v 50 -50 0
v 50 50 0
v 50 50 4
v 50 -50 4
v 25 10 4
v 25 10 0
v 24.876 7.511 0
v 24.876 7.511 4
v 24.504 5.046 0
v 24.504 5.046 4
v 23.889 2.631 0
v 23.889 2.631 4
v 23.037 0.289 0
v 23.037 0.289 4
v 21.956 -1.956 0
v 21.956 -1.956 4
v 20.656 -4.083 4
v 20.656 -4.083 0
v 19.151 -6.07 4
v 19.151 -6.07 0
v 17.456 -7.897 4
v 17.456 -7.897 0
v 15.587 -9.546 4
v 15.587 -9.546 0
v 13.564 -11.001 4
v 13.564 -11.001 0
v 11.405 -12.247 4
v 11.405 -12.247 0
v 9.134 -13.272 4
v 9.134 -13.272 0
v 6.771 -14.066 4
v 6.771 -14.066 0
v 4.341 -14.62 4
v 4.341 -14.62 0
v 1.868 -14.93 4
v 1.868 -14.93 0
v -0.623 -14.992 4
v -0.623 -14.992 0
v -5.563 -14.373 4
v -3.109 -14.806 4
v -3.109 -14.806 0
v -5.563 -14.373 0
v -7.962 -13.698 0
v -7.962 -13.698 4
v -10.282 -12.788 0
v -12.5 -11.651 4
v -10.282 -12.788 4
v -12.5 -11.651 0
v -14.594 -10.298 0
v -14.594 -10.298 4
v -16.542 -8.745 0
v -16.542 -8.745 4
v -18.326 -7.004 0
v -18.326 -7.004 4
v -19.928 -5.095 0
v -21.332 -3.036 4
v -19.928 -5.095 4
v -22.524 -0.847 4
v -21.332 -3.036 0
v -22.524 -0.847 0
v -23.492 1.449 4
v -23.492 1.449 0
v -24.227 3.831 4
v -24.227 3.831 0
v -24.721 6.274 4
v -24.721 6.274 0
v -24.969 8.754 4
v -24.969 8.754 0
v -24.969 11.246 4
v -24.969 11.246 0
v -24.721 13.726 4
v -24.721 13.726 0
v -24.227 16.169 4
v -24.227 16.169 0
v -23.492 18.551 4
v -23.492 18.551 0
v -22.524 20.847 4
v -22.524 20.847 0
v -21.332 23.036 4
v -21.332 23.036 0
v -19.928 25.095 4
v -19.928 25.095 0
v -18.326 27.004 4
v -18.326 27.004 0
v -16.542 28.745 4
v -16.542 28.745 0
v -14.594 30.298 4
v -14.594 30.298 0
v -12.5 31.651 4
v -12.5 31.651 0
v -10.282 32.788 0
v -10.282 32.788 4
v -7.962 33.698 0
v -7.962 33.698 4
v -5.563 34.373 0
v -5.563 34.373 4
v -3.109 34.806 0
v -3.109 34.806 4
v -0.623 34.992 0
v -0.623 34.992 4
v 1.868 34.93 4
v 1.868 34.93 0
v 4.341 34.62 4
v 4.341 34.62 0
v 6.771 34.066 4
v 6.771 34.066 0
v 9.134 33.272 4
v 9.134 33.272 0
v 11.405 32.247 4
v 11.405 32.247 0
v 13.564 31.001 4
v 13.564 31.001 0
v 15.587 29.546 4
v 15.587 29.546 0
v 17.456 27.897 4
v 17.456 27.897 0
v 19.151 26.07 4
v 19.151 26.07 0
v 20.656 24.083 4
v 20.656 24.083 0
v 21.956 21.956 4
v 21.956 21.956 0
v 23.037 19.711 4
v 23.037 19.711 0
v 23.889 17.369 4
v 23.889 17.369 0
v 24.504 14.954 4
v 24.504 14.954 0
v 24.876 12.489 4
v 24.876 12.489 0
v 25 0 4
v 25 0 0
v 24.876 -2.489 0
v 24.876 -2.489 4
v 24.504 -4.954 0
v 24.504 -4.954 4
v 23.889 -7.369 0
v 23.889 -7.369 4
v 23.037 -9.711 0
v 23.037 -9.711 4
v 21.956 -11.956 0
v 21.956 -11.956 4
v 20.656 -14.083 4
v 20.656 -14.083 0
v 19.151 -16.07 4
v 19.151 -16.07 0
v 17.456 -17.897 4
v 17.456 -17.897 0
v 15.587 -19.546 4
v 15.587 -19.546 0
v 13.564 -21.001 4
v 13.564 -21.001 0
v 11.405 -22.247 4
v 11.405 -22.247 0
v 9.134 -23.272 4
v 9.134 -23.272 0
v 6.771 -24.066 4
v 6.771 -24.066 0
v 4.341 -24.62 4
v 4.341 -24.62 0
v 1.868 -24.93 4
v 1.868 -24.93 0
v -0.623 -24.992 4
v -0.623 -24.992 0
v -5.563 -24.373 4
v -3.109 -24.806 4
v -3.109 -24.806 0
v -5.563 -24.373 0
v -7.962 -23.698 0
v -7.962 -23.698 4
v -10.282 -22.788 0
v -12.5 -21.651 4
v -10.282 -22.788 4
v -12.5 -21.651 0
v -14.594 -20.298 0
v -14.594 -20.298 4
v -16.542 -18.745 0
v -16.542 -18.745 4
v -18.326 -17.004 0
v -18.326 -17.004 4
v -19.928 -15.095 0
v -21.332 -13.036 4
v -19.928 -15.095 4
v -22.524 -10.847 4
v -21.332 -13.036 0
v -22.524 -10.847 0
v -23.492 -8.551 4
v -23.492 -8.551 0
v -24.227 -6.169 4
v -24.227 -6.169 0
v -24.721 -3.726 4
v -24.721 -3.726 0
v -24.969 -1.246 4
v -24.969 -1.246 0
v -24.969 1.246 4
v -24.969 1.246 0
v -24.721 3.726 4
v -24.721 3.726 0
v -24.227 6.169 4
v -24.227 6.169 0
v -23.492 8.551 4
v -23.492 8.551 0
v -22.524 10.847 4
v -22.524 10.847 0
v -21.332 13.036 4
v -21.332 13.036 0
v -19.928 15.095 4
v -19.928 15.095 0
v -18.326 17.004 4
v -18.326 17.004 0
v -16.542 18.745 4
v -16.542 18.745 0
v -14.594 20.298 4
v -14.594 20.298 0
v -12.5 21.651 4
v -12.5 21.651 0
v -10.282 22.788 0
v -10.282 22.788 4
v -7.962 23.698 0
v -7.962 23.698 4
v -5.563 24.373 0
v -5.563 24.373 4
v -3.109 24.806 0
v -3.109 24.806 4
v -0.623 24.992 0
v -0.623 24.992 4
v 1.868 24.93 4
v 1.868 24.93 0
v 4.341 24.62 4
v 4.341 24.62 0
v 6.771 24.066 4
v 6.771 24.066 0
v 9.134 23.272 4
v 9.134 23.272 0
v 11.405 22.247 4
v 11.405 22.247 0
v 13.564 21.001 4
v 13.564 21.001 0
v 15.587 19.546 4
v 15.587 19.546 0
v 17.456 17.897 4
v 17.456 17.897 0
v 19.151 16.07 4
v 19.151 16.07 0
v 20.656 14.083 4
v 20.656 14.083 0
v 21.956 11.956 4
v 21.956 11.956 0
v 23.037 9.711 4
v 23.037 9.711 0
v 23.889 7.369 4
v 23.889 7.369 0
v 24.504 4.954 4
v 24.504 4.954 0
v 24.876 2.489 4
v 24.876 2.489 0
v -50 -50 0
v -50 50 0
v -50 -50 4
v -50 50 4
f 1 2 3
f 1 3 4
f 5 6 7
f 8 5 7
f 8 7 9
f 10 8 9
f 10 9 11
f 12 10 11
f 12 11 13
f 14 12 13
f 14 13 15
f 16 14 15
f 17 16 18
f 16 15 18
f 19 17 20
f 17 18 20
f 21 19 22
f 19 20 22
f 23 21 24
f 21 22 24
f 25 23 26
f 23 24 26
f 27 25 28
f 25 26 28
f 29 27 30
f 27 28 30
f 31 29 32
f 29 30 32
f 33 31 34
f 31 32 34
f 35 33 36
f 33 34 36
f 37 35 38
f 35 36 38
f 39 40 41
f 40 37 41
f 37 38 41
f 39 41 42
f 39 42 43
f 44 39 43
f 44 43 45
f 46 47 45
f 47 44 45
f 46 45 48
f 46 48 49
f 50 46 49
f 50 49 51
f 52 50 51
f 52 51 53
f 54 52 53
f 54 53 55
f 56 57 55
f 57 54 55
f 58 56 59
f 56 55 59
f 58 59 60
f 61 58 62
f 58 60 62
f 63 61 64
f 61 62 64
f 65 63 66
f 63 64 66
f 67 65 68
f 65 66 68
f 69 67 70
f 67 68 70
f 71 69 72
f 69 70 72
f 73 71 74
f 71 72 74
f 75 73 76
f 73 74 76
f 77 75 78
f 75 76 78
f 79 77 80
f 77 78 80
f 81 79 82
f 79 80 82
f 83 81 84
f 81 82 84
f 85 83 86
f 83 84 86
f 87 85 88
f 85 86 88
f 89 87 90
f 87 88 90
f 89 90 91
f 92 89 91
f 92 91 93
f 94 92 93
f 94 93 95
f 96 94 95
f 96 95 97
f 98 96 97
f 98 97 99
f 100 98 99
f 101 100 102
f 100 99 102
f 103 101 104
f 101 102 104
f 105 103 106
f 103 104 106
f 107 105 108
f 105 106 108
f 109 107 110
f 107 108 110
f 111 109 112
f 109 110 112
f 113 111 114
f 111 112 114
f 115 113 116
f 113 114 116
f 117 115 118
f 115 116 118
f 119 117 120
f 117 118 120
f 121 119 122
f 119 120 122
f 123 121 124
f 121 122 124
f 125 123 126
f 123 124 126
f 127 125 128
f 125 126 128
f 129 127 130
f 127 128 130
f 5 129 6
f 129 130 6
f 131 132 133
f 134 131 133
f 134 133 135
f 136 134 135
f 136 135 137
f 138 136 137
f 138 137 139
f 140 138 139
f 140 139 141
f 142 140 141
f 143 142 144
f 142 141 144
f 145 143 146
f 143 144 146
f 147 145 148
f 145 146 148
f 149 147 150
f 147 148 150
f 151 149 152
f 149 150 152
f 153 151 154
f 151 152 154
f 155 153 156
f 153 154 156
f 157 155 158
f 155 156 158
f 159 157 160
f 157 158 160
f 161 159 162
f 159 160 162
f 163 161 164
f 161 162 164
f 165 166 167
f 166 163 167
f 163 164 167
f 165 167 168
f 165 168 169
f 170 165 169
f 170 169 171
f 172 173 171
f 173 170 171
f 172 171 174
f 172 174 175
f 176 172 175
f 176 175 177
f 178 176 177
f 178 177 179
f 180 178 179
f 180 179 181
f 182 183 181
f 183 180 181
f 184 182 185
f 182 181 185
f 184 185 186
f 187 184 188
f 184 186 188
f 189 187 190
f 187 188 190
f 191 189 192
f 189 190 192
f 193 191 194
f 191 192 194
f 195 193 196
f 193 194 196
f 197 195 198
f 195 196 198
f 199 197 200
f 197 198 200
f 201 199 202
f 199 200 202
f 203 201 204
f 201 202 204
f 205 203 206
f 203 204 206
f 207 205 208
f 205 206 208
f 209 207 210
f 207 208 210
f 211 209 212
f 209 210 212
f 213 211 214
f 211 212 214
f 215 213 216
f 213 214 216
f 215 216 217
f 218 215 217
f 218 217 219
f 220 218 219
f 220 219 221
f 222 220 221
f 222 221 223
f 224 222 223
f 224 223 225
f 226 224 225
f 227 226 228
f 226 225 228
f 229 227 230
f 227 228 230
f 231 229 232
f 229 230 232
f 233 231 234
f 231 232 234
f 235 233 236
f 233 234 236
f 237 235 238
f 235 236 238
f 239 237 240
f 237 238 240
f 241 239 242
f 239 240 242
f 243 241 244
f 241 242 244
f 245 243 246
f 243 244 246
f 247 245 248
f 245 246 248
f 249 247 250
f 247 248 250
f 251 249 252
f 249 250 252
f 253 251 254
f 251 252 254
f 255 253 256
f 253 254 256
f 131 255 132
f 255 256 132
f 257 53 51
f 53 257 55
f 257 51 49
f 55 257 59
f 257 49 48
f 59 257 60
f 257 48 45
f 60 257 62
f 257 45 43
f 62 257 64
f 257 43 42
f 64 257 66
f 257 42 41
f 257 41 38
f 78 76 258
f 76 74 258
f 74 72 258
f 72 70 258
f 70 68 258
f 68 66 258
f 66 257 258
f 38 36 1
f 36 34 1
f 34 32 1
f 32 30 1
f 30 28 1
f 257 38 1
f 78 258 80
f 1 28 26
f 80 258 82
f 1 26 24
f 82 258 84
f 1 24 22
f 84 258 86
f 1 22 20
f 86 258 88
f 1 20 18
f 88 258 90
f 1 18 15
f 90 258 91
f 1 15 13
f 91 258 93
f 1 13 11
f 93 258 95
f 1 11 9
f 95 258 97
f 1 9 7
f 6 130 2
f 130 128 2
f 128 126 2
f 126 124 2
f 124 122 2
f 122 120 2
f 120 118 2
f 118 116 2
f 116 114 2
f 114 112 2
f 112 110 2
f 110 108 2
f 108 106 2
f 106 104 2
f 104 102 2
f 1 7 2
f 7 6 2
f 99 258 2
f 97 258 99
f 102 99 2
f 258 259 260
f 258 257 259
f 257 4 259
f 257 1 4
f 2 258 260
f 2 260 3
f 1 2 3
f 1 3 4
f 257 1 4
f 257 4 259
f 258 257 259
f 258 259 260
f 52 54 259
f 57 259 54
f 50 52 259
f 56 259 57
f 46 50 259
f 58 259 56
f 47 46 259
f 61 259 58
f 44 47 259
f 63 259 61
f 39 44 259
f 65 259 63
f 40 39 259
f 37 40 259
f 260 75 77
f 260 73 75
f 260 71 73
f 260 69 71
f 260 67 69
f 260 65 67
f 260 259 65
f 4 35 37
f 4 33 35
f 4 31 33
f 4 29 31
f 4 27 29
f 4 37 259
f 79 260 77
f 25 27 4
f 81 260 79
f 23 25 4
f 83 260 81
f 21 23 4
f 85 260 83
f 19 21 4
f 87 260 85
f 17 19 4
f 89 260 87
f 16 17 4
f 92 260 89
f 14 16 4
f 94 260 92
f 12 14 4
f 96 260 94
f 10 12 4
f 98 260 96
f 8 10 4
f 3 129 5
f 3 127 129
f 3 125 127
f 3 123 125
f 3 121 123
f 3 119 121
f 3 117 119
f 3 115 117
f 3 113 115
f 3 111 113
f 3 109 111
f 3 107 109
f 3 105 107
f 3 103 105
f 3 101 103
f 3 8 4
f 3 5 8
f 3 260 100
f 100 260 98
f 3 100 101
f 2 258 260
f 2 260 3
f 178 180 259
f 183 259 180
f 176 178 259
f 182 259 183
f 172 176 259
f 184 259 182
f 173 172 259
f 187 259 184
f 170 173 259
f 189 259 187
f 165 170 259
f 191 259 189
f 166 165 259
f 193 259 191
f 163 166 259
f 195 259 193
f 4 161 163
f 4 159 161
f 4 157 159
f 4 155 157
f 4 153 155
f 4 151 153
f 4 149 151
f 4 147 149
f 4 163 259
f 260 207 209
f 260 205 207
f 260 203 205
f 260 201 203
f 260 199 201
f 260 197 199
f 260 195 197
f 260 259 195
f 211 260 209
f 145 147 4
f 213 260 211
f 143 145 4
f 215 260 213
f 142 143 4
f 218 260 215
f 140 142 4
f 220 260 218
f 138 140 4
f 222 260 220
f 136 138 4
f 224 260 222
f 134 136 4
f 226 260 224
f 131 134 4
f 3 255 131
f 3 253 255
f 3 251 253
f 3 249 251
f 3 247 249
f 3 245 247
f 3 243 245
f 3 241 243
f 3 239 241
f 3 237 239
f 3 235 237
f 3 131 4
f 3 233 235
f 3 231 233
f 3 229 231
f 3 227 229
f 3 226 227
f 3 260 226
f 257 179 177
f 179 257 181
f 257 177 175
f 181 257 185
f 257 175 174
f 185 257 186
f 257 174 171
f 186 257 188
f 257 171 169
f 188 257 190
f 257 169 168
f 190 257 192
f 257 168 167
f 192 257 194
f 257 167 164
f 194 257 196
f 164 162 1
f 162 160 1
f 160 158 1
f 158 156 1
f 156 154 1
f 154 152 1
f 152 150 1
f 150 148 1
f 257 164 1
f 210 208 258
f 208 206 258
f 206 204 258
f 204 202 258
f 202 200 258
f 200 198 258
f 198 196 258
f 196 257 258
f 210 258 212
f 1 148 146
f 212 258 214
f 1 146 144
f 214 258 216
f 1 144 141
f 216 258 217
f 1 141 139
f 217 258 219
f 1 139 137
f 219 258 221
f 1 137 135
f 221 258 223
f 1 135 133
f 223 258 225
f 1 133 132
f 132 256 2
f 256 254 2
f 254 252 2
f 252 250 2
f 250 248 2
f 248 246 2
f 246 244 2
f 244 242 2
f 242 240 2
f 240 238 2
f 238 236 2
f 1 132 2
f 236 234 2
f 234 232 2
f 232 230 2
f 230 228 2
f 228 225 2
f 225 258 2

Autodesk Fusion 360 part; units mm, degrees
sketch "Sketch1" plane through (0, 0, 0) normal (0, 0, 1) x (1, 0, 0) in component "Plate1"
  line L0 (-50, 50) -> (50, 50)
  line L1 (50, 50) -> (50, -50)
  line L2 (50, -50) -> (-50, -50)
  line L3 (-50, -50) -> (-50, 50)
  line L4 (-50, 50) -> (50, -50) construction
  line L5 (50, 50) -> (-50, -50) construction
  circle A0 centre (0, 0) radius 25
  dimension "d5" = 100
  dimension "d6" = 50
extrude "Extrude1" add sketch "Sketch1" along normal blind 4 makes body 1 in component "Plate1"
sketch "Sketch1 (2)" plane through (0, 0, 0) normal (0, 0, 1) x (1, 0, 0) in component "Plate1 (1)"
  line L0 (-50, 50) -> (50, 50)
  line L1 (50, 50) -> (50, -50)
  line L2 (50, -50) -> (-50, -50)
  line L3 (-50, -50) -> (-50, 50)
  line L4 (-50, 50) -> (50, -50) construction
  line L5 (50, 50) -> (-50, -50) construction
  circle A0 centre (0, 10) radius 25
  dimension "d5_1" = 100
  dimension "d6_1" = 50
  dimension "d9" = 40
extrude "Extrude1'" add sketch "Sketch1 (2)" along normal blind 4 separate body makes body 2 in component "Plate1 (1)"
component "Plate1" placed x (1, 0, 0) y (0, 1, 0) z (0, 0, 1) at (0, 0, 0)
component "Plate1 (1)" placed x (1, 0, 0) y (0, 1, 0) z (0, 0, 1) at (0, 0, 0)
equation "d6 = d5 / 2"
